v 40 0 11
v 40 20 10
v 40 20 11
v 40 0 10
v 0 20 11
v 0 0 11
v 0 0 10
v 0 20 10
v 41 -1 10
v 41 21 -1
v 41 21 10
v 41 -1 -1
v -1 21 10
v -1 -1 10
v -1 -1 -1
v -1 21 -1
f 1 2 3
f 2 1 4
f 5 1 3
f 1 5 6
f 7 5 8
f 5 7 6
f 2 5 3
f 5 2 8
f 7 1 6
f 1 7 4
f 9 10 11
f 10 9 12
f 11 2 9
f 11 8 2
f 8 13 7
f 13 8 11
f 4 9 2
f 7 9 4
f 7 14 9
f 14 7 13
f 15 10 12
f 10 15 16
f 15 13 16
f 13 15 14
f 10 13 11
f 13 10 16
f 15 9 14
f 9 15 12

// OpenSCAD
// Unit of length: Unit.MM
union()
{
   color(c = [1.0, 0.0, 0.0, 1.0])
   {
      cube(size = [40.0, 20.0, 11.0], center = false);
   }
   translate(v = [-1.0, -1.0, -1.0])
   {
      cube(size = [42.0, 22.0, 11.0], center = false);
   }
}
